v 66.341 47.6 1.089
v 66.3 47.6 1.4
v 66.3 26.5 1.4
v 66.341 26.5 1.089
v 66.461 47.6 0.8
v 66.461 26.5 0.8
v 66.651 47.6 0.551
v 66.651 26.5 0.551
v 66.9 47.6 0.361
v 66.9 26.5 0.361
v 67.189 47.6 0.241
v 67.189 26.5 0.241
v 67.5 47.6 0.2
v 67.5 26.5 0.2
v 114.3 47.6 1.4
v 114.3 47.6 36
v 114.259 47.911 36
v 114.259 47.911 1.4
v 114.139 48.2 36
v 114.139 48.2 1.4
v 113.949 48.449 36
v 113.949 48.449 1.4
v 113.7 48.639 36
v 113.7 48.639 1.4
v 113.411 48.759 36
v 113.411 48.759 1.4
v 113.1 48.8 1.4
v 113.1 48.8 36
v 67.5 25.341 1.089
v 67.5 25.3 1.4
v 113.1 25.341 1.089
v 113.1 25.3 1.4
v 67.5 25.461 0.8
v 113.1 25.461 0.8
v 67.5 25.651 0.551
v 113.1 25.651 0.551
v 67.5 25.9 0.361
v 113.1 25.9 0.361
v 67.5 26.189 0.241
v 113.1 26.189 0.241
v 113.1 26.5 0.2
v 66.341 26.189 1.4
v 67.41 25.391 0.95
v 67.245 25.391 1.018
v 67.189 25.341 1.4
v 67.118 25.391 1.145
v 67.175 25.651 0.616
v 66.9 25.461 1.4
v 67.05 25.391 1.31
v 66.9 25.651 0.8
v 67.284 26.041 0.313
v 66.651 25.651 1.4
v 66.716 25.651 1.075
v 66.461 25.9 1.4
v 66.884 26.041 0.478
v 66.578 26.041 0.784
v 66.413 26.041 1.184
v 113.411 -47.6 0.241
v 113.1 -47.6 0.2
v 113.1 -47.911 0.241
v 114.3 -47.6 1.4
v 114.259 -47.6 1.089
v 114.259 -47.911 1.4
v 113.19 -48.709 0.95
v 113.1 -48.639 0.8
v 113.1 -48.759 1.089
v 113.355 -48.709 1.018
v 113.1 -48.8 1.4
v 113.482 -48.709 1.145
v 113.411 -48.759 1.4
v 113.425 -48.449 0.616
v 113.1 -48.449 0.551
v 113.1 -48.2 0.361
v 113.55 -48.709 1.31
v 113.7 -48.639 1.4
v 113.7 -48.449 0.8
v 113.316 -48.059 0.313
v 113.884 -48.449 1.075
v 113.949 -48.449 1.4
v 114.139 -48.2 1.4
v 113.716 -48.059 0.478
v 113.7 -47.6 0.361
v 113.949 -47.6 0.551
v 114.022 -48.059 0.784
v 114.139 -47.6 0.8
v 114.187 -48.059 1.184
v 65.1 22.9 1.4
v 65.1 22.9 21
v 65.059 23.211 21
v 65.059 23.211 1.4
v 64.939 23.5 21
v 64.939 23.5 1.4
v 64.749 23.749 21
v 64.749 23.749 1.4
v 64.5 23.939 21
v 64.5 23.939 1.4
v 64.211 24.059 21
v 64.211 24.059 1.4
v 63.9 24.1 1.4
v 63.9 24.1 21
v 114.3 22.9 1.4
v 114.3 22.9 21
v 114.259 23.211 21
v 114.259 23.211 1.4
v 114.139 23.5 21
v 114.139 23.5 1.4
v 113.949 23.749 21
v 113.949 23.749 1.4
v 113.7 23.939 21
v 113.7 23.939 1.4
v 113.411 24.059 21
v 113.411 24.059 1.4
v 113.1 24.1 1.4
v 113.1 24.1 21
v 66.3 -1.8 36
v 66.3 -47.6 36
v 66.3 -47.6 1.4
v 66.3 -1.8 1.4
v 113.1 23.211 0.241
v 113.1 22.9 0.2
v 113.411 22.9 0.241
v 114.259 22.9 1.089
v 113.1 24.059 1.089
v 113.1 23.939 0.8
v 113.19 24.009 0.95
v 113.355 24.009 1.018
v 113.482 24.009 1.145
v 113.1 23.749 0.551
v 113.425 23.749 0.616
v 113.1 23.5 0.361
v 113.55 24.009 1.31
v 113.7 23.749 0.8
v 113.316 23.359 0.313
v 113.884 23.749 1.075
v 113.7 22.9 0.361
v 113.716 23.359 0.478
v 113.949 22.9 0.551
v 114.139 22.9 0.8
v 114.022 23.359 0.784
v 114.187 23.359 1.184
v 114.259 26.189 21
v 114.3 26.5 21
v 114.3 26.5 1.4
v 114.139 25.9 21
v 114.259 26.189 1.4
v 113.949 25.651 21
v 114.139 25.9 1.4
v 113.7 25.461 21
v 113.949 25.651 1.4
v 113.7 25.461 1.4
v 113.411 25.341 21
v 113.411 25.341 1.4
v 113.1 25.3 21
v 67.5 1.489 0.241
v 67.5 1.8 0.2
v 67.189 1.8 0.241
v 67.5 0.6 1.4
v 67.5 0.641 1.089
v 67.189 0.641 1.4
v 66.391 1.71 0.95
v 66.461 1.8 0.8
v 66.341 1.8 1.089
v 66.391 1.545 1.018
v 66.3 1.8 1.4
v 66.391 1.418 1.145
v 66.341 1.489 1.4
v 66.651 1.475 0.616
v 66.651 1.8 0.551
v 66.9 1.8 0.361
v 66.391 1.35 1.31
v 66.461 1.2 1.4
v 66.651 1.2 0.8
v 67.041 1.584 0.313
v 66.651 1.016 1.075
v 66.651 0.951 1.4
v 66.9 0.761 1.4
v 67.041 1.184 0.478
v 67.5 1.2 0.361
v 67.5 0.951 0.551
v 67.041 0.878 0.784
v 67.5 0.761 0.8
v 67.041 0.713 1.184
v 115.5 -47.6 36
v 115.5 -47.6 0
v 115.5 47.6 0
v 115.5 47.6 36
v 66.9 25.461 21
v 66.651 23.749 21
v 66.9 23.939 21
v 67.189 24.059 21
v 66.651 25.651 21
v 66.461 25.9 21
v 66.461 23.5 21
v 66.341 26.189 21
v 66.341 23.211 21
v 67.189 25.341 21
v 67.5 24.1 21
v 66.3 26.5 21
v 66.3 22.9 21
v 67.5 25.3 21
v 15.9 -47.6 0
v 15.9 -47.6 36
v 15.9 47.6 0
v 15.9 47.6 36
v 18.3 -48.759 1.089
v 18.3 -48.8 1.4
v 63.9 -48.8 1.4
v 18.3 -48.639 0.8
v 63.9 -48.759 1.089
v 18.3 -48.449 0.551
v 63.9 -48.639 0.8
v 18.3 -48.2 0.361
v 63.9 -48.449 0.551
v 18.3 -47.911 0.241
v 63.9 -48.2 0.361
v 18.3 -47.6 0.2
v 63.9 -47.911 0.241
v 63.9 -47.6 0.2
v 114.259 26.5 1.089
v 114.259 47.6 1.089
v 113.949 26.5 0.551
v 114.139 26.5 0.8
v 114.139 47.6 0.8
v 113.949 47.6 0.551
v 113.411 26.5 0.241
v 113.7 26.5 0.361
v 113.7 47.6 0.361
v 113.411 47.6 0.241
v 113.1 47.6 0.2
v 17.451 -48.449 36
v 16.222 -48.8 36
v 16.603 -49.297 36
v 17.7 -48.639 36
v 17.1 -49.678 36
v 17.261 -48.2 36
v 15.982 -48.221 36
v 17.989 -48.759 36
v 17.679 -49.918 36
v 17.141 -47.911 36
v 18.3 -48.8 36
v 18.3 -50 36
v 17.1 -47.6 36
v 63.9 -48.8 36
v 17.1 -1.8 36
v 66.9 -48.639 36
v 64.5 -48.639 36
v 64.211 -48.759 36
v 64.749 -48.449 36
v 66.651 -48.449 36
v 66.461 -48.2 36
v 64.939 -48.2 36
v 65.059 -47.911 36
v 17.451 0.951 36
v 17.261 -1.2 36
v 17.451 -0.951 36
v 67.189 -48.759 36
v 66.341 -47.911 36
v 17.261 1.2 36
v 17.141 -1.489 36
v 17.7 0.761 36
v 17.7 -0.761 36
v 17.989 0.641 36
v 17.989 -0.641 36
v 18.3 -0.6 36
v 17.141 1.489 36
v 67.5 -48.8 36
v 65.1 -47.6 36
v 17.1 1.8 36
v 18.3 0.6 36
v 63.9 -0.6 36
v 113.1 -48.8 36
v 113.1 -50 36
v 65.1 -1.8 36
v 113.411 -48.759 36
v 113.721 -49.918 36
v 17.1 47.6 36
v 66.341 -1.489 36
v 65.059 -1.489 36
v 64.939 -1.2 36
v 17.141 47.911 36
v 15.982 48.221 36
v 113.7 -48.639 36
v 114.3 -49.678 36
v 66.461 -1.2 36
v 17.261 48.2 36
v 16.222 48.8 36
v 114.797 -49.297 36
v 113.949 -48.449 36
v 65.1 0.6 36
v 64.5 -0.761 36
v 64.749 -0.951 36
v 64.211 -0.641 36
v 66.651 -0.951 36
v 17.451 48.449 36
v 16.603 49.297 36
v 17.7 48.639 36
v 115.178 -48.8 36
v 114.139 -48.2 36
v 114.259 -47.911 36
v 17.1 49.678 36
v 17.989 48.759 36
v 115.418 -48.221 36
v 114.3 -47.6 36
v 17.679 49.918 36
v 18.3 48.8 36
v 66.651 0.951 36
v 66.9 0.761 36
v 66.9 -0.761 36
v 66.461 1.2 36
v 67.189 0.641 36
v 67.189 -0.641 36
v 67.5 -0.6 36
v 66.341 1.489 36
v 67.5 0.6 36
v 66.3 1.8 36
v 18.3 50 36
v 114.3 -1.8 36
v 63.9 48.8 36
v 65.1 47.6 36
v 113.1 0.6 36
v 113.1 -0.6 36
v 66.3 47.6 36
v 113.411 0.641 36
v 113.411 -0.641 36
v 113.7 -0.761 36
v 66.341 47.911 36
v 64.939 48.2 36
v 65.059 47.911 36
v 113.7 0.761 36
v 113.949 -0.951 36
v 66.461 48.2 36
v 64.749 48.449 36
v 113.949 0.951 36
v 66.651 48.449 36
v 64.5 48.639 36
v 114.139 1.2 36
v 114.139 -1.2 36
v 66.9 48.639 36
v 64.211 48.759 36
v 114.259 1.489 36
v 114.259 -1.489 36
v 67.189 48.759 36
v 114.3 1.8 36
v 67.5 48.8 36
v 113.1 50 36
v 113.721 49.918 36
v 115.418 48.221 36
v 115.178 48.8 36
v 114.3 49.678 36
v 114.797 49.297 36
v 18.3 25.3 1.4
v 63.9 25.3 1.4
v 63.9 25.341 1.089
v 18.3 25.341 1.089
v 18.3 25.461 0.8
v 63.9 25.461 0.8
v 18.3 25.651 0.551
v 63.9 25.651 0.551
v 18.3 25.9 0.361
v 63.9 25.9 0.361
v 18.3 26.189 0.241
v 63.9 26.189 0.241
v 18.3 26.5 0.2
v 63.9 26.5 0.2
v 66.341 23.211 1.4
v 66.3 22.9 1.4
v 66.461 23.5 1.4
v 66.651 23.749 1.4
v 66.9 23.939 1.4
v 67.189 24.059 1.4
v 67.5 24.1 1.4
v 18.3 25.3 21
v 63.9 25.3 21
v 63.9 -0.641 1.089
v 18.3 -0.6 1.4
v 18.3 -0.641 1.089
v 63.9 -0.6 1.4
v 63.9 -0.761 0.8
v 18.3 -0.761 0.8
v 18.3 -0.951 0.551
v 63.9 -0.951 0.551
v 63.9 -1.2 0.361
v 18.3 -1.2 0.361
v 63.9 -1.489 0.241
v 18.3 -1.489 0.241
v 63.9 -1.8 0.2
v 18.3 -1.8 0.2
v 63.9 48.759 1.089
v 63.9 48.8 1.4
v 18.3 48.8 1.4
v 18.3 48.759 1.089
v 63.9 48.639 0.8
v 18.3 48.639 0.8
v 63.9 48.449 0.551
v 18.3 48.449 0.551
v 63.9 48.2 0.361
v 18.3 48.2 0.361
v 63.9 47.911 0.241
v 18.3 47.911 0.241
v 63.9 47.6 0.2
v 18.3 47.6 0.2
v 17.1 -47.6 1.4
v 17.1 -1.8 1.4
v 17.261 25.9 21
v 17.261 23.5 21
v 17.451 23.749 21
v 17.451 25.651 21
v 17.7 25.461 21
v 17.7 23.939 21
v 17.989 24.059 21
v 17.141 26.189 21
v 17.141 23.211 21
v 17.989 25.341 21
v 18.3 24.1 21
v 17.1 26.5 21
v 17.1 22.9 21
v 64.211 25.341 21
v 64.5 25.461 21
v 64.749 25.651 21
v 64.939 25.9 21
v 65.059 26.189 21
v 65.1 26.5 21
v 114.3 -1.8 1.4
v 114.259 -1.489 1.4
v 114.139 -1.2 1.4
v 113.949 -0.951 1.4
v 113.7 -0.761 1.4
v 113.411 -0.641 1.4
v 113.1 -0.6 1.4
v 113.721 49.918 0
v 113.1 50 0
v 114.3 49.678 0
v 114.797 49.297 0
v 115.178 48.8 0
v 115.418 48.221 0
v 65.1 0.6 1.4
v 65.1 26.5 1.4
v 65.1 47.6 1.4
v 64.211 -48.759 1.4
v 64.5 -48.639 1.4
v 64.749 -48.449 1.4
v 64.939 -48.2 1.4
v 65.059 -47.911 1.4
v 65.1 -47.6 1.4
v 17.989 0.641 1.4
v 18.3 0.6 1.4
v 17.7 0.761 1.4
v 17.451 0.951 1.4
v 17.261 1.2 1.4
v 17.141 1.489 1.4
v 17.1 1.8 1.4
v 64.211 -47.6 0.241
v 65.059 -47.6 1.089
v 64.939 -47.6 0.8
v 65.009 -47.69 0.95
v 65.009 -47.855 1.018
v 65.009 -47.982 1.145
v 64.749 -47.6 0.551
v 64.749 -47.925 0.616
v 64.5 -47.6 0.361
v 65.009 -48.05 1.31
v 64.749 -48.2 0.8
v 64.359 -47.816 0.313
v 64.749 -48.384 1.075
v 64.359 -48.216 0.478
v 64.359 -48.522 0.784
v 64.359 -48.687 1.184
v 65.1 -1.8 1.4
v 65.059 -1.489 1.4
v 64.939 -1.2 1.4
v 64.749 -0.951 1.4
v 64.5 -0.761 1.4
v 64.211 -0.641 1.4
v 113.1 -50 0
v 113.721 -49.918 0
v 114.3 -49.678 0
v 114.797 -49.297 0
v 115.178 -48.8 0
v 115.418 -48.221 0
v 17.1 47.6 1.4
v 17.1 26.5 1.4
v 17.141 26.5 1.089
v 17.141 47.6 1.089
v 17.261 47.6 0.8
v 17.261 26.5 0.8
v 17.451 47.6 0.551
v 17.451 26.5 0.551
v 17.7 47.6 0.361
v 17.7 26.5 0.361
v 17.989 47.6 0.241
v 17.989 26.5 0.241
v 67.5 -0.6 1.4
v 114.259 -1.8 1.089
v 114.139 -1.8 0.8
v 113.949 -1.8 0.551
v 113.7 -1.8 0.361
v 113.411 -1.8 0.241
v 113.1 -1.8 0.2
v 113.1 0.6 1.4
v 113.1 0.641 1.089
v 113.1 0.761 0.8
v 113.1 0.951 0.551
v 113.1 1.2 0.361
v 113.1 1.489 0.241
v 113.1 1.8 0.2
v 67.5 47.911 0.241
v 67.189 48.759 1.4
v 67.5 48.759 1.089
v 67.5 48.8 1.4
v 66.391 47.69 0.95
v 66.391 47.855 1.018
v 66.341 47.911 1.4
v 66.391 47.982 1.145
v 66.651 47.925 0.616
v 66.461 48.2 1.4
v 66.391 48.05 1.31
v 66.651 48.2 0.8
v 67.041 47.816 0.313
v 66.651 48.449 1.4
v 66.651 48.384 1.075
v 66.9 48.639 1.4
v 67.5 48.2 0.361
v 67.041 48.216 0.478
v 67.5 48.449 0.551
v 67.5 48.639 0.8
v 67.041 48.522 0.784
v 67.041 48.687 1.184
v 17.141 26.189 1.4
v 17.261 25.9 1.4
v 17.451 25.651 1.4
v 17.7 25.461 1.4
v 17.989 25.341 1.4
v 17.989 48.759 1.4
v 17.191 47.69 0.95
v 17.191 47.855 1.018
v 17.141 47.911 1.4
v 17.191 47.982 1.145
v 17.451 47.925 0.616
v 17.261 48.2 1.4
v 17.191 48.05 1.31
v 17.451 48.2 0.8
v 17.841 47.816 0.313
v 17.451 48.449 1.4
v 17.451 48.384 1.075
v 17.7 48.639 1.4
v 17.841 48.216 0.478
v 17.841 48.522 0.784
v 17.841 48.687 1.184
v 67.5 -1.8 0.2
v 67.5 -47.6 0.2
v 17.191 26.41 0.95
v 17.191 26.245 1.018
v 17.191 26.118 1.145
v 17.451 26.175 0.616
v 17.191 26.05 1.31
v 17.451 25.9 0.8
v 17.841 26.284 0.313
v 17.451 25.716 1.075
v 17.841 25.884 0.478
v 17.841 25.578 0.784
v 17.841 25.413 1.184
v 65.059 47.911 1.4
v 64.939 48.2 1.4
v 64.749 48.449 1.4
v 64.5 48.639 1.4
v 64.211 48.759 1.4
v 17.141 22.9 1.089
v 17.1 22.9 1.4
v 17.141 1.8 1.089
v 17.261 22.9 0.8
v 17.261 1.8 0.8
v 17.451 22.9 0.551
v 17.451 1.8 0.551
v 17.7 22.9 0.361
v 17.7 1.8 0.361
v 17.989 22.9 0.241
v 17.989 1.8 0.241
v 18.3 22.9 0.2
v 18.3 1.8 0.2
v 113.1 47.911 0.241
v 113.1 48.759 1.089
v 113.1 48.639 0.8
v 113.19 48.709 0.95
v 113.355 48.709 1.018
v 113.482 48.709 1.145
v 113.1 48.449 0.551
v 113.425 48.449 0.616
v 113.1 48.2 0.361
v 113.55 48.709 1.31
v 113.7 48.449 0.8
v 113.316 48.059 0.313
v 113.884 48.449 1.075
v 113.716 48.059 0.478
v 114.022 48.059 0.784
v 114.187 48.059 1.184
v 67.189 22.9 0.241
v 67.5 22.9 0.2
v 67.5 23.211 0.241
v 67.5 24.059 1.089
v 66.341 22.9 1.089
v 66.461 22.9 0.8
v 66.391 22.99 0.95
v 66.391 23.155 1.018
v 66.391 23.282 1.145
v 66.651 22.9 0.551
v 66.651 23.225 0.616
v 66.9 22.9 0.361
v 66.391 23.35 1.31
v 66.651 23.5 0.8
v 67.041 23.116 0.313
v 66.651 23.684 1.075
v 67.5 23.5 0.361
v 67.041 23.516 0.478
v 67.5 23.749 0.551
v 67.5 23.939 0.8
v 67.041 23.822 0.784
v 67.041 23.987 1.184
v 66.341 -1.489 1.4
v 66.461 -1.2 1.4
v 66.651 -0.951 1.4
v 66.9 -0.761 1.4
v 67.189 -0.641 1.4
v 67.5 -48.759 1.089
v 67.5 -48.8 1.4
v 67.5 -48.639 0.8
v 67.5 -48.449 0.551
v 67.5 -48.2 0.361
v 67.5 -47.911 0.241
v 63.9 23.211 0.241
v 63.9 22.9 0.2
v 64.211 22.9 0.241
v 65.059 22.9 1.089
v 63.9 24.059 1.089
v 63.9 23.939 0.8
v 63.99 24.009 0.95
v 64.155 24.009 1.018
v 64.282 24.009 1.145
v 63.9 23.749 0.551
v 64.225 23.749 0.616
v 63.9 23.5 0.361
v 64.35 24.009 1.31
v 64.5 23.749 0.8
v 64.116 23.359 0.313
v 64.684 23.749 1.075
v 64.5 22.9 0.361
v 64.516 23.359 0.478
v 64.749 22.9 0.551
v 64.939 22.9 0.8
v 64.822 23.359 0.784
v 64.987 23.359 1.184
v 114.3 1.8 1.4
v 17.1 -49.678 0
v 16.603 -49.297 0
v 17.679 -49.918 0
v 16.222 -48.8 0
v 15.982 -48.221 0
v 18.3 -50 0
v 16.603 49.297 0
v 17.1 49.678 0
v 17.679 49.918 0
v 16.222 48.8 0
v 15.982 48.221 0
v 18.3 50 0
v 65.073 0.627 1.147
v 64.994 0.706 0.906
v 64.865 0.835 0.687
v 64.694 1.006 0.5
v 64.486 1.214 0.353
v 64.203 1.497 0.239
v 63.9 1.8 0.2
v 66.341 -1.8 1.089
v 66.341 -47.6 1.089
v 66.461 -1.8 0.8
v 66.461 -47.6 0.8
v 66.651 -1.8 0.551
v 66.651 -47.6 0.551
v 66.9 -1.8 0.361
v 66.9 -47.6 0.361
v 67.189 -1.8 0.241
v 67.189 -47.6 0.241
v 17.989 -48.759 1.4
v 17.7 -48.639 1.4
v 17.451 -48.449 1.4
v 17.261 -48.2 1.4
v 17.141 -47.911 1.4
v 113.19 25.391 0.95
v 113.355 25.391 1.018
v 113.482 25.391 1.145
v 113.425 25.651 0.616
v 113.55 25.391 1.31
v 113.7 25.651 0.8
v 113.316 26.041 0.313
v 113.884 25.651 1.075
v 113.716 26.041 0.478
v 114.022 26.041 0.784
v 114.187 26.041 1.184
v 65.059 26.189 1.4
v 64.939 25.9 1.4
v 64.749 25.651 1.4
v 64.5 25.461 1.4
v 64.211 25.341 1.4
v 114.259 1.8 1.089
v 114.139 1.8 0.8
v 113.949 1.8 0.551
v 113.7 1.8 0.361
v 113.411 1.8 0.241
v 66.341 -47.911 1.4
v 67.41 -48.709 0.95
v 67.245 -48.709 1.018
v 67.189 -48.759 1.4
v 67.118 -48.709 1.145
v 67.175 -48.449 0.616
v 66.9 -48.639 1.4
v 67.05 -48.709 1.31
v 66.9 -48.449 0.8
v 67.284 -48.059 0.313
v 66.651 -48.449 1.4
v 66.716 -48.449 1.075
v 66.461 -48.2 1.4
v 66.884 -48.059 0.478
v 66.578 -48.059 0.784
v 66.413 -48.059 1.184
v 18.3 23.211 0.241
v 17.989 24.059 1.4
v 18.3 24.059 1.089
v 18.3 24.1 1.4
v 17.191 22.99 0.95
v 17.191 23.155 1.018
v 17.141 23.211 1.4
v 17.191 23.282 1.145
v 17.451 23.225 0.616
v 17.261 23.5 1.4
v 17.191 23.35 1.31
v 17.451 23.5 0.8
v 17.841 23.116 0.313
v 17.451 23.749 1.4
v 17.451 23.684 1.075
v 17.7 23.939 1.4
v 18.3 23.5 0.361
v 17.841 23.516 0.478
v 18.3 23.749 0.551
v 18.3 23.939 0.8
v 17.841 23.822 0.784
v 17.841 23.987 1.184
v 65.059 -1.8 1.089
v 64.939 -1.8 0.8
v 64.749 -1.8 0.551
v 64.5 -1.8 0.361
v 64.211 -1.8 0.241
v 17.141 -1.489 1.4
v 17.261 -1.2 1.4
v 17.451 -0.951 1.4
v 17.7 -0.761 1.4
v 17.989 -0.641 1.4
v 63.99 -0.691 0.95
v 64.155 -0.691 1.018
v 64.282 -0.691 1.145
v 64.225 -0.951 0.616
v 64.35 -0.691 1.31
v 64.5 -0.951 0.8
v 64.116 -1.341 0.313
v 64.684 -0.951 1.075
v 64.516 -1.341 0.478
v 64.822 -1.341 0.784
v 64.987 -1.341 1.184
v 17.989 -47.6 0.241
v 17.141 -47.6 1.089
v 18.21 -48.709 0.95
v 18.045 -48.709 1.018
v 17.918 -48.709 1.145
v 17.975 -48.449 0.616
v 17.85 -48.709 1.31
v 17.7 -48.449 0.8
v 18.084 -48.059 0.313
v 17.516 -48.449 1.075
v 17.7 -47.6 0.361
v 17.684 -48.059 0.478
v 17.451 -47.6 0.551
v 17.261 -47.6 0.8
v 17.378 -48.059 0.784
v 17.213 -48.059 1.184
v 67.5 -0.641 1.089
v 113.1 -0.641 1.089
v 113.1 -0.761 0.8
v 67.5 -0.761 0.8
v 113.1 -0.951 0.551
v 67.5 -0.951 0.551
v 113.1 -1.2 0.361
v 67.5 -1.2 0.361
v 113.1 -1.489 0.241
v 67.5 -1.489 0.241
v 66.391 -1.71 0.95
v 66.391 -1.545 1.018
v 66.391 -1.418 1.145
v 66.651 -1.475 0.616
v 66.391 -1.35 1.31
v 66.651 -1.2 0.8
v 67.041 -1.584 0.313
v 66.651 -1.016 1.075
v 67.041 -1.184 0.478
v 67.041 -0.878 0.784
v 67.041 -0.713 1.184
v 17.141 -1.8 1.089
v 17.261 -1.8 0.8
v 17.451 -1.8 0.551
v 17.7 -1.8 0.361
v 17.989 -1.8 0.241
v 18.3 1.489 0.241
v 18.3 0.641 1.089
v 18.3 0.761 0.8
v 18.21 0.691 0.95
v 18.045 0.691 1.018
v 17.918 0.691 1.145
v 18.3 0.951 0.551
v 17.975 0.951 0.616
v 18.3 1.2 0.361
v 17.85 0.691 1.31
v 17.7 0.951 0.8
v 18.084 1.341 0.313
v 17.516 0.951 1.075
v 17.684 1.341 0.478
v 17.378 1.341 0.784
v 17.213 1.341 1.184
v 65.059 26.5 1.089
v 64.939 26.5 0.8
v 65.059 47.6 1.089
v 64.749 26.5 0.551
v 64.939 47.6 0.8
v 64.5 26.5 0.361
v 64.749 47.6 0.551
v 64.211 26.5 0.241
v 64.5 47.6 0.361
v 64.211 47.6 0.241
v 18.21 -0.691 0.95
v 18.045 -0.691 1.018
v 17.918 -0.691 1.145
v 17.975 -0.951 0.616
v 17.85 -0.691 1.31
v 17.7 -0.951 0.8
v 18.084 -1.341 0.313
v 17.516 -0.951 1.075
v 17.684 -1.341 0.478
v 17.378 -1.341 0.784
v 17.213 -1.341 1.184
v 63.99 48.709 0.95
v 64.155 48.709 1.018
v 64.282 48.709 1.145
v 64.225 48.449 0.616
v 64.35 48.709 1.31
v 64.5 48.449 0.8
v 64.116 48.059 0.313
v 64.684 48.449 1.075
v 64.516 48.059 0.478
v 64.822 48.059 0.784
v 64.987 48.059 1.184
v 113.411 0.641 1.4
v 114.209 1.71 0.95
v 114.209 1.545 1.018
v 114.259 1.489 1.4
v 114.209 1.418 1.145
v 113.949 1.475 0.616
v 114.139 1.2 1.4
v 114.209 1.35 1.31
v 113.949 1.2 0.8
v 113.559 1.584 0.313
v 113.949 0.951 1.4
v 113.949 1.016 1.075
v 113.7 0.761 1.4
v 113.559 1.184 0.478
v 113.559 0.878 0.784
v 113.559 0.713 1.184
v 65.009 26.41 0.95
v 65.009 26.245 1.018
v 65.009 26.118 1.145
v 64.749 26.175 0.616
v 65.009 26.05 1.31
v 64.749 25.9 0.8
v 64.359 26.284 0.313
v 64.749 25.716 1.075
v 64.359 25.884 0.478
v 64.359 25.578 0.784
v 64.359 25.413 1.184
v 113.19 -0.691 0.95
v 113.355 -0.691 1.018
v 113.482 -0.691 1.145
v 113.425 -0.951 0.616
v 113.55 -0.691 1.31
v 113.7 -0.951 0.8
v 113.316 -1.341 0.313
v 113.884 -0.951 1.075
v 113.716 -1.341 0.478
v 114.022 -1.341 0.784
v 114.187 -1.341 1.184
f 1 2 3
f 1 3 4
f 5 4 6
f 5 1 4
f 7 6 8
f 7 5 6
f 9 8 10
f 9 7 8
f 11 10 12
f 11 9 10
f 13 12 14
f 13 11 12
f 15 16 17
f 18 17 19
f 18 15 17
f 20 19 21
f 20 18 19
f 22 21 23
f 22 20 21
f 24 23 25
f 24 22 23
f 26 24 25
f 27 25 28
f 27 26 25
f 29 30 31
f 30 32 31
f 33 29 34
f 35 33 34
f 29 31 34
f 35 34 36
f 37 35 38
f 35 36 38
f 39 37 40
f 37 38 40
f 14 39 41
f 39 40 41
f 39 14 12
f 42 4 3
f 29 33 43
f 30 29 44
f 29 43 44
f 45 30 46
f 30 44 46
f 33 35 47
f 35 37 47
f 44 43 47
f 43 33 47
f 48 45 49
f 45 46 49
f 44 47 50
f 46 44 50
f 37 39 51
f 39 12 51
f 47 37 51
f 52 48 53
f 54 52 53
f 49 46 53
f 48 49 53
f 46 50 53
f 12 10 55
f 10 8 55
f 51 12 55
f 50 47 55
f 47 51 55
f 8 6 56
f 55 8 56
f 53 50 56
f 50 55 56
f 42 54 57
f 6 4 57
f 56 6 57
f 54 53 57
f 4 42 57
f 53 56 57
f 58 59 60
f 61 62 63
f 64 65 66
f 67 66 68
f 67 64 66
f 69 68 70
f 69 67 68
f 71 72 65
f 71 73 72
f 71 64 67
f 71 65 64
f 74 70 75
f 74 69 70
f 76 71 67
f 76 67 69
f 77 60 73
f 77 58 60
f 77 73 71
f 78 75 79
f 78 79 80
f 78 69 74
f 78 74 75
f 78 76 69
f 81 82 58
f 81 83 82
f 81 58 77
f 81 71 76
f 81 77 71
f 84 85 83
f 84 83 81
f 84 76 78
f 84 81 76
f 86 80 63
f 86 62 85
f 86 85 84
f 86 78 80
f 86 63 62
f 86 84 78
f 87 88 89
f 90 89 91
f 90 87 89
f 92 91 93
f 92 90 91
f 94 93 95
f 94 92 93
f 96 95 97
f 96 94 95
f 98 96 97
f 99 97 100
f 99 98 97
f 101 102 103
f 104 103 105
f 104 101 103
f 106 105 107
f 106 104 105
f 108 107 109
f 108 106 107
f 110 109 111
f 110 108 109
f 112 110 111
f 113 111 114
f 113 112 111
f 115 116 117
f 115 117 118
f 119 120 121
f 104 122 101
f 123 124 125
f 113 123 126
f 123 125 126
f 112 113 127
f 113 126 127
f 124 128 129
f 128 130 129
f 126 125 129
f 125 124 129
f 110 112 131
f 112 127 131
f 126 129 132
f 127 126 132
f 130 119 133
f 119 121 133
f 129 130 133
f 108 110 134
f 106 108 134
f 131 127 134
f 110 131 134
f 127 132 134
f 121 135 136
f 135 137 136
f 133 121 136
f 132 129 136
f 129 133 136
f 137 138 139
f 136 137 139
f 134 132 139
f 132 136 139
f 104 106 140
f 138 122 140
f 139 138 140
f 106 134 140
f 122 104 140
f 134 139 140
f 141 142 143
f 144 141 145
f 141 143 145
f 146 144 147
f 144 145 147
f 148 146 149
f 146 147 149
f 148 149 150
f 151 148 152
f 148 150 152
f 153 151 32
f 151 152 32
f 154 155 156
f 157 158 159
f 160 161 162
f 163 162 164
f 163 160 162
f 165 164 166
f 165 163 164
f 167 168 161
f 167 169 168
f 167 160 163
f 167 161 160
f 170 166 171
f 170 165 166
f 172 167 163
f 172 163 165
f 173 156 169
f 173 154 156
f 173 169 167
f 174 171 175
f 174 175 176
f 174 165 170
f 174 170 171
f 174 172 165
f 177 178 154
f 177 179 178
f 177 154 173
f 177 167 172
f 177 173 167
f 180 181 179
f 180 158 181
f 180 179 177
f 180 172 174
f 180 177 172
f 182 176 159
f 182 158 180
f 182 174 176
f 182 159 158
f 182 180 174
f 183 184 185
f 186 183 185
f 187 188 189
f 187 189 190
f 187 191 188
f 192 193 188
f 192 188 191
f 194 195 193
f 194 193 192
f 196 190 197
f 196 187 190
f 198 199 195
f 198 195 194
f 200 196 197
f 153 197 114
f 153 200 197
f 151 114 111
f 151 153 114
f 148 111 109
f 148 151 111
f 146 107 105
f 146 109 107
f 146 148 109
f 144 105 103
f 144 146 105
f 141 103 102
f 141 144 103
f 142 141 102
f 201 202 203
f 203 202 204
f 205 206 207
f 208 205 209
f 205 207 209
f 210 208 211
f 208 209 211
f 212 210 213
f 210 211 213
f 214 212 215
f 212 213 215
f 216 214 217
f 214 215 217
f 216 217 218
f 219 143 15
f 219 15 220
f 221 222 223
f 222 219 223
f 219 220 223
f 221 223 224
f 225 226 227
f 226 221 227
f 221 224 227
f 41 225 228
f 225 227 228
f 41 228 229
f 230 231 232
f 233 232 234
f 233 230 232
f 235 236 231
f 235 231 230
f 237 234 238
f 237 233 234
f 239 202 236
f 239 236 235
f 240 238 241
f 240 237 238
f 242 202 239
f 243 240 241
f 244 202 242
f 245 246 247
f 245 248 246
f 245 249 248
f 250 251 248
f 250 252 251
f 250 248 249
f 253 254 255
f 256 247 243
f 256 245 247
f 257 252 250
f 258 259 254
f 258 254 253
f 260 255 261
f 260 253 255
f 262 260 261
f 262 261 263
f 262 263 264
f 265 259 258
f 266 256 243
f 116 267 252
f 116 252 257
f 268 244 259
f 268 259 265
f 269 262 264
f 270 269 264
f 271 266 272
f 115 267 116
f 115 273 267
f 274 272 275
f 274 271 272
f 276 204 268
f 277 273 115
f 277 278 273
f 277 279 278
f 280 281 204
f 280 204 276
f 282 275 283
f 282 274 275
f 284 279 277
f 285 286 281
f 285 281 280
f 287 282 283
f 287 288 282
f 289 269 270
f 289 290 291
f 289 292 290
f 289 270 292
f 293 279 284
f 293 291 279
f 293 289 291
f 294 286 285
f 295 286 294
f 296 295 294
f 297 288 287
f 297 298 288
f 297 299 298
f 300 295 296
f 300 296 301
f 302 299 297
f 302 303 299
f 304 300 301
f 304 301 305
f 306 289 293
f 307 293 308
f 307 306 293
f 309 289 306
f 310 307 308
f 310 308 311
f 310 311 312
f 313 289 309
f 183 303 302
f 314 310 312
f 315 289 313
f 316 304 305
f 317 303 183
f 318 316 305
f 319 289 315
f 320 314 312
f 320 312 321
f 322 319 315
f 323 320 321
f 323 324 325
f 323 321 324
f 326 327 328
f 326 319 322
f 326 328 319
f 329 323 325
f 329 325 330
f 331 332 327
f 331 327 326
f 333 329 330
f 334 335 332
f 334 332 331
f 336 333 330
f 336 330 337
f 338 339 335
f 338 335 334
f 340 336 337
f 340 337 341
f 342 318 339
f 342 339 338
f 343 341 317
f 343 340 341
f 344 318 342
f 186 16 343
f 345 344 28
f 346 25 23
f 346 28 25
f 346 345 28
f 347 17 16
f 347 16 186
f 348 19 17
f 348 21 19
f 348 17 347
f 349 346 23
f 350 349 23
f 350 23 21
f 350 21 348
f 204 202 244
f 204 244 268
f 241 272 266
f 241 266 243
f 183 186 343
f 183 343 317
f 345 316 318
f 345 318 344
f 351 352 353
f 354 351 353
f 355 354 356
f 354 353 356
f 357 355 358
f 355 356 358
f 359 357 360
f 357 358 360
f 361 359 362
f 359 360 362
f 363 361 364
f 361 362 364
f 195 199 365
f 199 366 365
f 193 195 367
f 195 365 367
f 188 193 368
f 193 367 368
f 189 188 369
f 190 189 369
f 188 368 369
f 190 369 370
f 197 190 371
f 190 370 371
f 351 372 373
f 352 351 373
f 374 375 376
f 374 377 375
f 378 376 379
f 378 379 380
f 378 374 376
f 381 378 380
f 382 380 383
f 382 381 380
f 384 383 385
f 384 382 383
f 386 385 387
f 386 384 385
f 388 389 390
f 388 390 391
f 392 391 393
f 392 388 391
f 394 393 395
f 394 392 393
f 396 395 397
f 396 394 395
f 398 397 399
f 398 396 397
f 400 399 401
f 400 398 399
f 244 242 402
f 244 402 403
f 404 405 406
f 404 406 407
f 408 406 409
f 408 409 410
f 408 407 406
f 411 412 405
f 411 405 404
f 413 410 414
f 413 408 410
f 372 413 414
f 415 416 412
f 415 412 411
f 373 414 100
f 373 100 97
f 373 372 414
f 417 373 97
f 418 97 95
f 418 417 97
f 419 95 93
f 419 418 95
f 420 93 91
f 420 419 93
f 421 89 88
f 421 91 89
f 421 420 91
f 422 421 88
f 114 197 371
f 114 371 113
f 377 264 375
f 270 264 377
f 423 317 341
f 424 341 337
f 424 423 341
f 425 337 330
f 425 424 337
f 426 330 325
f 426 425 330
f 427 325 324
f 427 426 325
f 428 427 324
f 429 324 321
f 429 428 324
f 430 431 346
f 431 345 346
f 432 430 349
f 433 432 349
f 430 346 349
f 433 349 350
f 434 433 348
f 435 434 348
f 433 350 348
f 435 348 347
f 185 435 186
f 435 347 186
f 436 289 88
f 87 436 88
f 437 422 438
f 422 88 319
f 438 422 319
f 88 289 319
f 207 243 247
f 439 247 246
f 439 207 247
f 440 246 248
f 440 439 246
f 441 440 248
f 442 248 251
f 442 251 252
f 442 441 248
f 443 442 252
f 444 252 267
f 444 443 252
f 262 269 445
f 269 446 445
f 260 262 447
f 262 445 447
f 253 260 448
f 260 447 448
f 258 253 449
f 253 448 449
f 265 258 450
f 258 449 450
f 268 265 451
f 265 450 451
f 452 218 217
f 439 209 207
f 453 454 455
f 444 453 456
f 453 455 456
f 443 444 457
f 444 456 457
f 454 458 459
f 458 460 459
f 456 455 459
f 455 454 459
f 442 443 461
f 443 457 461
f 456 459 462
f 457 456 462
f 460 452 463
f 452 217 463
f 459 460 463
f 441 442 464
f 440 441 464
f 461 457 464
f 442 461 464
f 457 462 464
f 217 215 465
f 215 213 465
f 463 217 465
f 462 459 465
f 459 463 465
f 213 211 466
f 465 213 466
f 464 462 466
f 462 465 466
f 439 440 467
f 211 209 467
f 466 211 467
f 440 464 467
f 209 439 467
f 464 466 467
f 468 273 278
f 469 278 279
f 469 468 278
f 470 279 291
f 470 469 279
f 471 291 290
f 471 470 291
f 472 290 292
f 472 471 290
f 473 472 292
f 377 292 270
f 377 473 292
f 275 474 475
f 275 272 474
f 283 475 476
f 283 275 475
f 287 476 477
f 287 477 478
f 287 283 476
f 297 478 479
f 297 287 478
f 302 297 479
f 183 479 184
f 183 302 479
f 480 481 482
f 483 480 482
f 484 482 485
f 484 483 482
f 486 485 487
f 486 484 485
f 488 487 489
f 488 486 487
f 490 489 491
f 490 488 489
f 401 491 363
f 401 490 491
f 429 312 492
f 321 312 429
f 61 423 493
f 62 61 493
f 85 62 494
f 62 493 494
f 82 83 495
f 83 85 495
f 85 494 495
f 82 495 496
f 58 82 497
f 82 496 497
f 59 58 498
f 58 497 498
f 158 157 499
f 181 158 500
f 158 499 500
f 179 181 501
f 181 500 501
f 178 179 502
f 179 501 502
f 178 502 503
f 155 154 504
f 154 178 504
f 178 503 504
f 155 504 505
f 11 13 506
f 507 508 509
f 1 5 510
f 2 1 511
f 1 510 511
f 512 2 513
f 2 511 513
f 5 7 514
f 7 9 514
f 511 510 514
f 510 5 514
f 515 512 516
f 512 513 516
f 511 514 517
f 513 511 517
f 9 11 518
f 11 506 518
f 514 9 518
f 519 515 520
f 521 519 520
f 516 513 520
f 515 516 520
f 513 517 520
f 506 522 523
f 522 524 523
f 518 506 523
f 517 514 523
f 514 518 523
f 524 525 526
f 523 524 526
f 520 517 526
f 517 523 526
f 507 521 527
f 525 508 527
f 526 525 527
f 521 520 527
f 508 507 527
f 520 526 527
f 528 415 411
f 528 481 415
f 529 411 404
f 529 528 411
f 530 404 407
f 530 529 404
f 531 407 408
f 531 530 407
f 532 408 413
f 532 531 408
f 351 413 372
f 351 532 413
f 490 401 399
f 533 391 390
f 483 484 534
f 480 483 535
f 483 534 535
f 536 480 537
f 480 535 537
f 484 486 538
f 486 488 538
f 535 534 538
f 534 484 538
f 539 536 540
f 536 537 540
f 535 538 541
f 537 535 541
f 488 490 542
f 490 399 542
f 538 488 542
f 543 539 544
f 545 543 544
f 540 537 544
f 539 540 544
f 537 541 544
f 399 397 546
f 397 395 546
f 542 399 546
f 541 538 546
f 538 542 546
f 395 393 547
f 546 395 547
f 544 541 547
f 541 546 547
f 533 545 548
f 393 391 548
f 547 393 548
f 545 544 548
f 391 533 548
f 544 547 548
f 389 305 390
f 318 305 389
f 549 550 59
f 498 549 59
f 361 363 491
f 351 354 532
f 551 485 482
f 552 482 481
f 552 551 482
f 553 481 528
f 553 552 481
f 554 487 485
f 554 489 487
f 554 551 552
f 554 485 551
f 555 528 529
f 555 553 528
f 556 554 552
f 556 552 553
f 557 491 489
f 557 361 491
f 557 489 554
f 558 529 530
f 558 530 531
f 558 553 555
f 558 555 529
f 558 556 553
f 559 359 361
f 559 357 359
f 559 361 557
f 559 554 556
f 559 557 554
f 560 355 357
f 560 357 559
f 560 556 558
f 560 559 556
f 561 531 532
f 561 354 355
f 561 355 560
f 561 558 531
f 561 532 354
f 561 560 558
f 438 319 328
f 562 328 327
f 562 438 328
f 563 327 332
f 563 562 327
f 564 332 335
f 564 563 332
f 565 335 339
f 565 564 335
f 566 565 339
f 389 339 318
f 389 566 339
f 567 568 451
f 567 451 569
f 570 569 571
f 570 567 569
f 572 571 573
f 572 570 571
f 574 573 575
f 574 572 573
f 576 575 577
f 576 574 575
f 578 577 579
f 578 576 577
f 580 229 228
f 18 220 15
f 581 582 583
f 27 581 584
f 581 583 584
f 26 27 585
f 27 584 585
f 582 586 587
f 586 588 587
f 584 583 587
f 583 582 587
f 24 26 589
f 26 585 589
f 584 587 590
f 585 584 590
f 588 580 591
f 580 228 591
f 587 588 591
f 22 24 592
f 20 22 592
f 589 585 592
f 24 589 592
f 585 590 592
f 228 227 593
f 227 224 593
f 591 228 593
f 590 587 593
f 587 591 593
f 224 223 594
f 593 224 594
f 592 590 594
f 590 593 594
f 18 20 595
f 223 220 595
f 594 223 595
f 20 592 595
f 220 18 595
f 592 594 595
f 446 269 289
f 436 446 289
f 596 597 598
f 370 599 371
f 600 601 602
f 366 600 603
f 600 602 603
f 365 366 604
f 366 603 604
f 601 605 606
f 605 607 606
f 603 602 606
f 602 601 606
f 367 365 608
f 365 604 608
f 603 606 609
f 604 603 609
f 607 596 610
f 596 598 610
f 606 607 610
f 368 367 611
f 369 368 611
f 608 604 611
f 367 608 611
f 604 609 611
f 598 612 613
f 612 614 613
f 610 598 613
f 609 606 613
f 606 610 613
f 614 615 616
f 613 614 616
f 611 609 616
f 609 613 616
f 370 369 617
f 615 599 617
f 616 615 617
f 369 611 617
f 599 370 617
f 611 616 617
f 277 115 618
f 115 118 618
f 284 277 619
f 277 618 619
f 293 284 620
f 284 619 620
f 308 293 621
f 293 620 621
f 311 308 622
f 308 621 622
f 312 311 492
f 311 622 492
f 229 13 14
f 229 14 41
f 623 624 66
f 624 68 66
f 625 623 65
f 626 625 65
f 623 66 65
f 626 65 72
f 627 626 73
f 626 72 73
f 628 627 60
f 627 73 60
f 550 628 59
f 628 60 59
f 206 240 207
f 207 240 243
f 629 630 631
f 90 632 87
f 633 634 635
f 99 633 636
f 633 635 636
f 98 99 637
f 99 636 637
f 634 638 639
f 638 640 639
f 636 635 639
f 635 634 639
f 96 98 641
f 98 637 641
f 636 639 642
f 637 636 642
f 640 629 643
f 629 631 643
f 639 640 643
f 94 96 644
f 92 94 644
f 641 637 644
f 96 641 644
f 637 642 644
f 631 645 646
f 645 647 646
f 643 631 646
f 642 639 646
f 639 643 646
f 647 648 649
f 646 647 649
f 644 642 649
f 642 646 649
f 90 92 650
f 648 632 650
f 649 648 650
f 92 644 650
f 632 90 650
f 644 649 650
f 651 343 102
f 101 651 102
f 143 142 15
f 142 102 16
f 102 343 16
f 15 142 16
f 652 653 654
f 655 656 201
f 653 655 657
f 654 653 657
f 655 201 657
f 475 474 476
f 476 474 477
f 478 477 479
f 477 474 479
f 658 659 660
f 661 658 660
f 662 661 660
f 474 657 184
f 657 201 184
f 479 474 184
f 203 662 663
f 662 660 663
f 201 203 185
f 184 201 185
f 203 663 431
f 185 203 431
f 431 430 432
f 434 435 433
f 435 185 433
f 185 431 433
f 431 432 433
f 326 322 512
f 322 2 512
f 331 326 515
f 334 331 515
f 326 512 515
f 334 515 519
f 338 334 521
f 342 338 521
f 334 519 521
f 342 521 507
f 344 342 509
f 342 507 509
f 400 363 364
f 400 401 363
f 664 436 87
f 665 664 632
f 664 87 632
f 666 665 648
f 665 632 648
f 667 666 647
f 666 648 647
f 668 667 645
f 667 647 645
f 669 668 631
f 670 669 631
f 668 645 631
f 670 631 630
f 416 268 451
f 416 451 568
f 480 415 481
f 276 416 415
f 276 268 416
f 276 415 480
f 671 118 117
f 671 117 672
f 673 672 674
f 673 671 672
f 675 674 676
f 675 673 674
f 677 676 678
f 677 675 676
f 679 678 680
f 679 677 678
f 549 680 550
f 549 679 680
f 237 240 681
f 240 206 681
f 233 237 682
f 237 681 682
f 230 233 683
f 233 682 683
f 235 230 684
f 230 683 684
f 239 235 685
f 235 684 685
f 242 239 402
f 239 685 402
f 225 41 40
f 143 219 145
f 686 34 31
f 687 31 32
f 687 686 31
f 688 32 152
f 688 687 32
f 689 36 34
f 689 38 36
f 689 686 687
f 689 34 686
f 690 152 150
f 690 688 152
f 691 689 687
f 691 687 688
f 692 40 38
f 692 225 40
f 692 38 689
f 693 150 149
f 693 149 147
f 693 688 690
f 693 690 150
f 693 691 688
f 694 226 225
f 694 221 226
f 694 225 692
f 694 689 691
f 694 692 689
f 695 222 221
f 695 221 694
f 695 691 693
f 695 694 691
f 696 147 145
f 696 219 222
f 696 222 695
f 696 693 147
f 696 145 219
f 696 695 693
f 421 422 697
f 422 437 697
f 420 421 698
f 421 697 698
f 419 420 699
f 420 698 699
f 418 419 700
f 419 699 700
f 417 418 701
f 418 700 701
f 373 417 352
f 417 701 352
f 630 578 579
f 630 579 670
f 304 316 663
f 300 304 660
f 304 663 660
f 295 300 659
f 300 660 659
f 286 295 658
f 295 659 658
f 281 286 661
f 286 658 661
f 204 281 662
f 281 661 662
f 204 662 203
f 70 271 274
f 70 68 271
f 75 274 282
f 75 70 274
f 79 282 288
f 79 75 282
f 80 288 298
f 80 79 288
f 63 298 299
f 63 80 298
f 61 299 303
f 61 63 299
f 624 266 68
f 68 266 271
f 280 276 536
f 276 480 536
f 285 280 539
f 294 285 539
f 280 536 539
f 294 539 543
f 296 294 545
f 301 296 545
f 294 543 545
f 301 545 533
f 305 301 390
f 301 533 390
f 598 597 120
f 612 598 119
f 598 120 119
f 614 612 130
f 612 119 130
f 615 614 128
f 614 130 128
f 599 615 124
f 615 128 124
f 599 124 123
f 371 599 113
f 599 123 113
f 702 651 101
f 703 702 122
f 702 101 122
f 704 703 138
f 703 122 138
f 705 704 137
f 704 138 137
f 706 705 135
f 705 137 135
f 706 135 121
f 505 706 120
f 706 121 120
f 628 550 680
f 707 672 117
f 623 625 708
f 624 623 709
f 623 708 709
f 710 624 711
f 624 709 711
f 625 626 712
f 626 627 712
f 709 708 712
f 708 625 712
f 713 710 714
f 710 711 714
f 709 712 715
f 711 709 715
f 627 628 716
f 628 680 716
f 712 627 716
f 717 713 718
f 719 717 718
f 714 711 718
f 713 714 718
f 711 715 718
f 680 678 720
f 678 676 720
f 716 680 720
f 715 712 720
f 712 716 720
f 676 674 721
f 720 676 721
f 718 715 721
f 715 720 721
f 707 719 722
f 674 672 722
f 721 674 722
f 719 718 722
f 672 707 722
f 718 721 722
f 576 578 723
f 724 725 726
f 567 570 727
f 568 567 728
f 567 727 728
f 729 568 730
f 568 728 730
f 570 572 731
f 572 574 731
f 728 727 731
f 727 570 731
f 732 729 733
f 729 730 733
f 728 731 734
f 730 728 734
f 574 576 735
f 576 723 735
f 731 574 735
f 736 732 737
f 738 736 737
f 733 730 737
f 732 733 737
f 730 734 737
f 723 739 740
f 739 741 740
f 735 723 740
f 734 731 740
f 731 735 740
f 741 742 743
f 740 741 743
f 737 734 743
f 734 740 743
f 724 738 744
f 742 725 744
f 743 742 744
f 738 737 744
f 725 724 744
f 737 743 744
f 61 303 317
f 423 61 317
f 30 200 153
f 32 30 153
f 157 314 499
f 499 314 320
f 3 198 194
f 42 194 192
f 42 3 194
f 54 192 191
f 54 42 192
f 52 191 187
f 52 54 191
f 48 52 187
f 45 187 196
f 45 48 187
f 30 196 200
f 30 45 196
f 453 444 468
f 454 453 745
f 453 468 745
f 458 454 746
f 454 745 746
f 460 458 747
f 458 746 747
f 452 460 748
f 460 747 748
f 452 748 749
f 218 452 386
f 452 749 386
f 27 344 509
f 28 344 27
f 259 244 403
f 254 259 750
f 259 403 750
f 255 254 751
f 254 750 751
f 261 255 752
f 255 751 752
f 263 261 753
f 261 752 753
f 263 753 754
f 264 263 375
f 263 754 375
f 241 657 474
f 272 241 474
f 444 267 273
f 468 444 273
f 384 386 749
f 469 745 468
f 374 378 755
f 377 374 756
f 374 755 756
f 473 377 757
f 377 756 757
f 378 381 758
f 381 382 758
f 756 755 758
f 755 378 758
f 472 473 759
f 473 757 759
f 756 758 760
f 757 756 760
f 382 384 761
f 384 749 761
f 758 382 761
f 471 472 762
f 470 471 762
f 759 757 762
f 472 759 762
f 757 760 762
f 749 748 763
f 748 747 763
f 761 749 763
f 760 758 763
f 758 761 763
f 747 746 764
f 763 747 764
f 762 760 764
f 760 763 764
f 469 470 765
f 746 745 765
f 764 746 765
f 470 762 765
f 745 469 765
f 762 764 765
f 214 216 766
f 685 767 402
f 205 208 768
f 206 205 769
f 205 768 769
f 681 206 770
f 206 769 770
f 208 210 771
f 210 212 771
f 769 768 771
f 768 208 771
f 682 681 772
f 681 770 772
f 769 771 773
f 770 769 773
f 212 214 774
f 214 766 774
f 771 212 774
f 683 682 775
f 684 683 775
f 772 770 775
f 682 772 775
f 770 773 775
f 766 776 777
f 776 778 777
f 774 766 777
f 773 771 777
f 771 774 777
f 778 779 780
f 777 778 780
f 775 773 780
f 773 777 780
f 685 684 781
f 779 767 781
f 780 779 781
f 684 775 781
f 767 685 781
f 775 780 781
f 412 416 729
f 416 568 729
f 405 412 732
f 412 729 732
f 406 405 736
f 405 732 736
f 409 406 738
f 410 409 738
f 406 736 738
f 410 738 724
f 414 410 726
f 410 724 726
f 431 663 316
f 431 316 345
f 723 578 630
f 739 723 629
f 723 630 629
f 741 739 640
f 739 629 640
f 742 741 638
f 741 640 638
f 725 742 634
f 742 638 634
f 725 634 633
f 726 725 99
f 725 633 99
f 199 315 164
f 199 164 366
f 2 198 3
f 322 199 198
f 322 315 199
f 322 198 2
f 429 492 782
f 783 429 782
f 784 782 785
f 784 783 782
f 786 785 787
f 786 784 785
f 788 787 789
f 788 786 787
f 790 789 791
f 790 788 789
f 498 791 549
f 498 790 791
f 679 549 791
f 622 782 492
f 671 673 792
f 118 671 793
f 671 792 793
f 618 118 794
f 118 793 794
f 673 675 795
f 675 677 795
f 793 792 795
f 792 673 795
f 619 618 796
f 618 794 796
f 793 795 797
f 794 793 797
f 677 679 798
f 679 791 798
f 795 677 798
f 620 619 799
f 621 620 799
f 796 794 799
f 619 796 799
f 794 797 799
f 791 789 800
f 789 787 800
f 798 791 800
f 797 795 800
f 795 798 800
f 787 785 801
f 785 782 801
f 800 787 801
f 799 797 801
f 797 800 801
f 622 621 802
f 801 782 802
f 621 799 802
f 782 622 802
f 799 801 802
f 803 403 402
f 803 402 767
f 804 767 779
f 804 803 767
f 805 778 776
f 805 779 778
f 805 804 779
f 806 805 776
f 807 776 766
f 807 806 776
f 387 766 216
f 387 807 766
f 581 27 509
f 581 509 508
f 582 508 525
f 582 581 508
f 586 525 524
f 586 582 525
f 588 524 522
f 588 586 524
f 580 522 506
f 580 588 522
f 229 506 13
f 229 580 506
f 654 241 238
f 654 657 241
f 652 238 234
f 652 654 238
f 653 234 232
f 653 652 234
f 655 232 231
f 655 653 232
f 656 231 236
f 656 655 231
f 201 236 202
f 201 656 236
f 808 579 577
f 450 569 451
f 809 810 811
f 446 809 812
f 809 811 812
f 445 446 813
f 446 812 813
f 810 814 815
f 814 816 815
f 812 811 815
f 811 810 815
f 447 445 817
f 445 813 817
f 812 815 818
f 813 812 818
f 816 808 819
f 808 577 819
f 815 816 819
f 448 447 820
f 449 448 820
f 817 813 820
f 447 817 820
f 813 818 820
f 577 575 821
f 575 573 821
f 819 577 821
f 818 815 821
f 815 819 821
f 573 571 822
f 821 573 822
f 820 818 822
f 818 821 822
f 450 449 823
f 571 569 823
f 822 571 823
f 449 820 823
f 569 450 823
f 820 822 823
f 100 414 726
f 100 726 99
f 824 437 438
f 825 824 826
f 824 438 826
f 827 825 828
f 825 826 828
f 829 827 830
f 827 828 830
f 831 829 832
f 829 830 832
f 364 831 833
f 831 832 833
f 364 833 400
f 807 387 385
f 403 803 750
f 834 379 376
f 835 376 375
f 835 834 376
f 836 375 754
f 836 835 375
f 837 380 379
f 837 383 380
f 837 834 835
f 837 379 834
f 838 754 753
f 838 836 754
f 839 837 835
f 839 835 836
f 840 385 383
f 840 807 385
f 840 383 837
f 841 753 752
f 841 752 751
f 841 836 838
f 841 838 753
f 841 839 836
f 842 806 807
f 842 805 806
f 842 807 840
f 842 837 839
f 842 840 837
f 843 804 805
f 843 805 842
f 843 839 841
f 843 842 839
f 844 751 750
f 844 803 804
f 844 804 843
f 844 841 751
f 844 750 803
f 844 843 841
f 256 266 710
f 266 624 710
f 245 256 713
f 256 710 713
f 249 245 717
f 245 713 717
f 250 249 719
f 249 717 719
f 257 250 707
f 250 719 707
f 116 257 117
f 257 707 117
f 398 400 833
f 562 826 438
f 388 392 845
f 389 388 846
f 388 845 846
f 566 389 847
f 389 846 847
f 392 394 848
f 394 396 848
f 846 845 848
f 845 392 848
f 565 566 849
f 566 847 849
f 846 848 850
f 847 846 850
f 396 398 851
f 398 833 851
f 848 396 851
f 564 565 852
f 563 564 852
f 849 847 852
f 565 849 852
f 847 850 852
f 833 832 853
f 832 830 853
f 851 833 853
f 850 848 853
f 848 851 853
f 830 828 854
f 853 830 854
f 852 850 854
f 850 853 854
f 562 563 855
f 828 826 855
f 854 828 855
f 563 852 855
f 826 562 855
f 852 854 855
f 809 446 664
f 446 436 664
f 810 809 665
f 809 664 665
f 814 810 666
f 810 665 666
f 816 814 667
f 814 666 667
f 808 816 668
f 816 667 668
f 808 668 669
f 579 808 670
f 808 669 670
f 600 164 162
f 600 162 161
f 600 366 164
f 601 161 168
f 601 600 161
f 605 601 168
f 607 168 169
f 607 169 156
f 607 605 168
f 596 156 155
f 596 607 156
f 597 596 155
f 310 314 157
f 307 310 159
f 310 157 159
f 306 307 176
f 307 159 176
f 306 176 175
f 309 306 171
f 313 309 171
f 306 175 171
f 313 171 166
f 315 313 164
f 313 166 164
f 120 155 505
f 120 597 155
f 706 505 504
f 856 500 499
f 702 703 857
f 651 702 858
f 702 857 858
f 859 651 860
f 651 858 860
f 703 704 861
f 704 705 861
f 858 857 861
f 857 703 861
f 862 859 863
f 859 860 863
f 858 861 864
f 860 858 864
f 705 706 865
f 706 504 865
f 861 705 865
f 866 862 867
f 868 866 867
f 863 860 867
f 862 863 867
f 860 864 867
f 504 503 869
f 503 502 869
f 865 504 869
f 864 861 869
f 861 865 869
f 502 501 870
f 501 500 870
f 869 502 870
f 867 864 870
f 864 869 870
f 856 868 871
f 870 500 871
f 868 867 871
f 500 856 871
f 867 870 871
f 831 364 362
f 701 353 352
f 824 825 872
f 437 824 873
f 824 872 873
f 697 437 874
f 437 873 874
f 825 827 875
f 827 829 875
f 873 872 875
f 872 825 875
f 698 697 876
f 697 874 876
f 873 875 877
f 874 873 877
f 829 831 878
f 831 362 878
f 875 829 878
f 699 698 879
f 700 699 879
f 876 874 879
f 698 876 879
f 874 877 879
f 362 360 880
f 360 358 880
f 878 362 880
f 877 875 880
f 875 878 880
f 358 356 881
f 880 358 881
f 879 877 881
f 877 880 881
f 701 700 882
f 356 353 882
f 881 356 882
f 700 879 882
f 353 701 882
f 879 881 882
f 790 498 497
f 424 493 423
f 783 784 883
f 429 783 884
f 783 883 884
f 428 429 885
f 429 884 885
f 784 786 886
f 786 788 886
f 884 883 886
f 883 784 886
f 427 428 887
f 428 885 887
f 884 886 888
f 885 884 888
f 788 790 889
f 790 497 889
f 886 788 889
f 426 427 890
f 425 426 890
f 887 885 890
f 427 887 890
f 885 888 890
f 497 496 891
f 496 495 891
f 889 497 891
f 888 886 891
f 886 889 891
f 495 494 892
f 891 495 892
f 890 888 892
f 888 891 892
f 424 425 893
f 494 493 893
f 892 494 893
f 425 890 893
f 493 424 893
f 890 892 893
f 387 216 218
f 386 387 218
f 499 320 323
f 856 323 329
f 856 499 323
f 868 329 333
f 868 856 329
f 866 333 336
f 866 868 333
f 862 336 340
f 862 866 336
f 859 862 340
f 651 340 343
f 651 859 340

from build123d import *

# Parameters (mm, degrees)
F0_W      = 231
F0_H      = 100
F1_DEPTH  = 36
F2_W      = 48
F2_H      = 23.5
F2_H_2    = 48.2
F3_DEPTH  = 35.8
F4_W      = 48
F4_H      = 1.2
F5_DEPTH  = 15
F6_W      = 48
F6_H      = 97.6
F6_W_2    = 81
F7_DEPTH  = 35.8
F8_R      = 2.4
F9_R      = 1.2
F10_W     = 145.4325905085
F10_H     = 144.5563584566
F11_DEPTH = 40
F12_R     = 2.4


with BuildPart() as f1:
    # F0 (on Top) → F1 (new body)
    with BuildSketch(Plane.XY):
        Rectangle(F0_W, F0_H)
    extrude(amount=F1_DEPTH)

    # F2 (on face) → F3 (cut)
    with BuildSketch(Plane.XY.offset(36)):
        with Locations((41.1, 37.05)):
            Rectangle(F2_W, F2_H)
        with Locations((90.3, 37.05)):
            Rectangle(F2_W, F2_H)
        with Locations((41.1, 12.35)):
            Rectangle(F2_W, F2_H)
        with Locations((90.3, 12.35)):
            Rectangle(F2_W, F2_H)
        with Locations((41.1, -24.7)):
            Rectangle(F2_W, F2_H_2)
        with Locations((90.3, -24.7)):
            Rectangle(F2_W, F2_H_2)
    extrude(amount=-F3_DEPTH, mode=Mode.SUBTRACT)

    # F4 (on face) → F5 (cut)
    with BuildSketch(Plane.XY.offset(36)):
        with Locations((41.1, 24.7)):
            Rectangle(F4_W, F4_H)
        with Locations((90.3, 24.7)):
            Rectangle(F4_W, F4_H)
    extrude(amount=-F5_DEPTH, mode=Mode.SUBTRACT)

    # F6 (on face) → F7 (cut)
    with BuildSketch(Plane.XY.offset(36)):
        with Locations((-90.3, 0)):
            Rectangle(F6_W, F6_H)
        with Locations((-24.6, 0)):
            Rectangle(F6_W_2, F6_H)
    extrude(amount=-F7_DEPTH, mode=Mode.SUBTRACT)

    # F8
    f8_edges = [f1.edges().sort_by_distance(p)[0] for p in [
        (-115.5, -50, 18),
        (-115.5, 50, 18),
        (115.5, 50, 18),
        (115.5, -50, 18),
    ]]
    fillet(f8_edges, radius=F8_R)

    # F9
    f9_edges = [f1.edges().sort_by_distance(p)[0] for p in [
        (-90.3, 48.8, 0.2),
        (-114.3, 0, 0.2),
        (-90.3, -48.8, 0.2),
        (-66.3, 0, 0.2),
        (-24.6, 48.8, 0.2),
        (-65.1, 0, 0.2),
        (-24.6, -48.8, 0.2),
        (15.9, 0, 0.2),
        (41.1, 25.3, 0.2),
        (65.1, 37.05, 0.2),
        (41.1, 48.8, 0.2),
        (17.1, 37.05, 0.2),
        (114.3, 37.05, 0.2),
        (90.3, 48.8, 0.2),
        (66.3, 37.05, 0.2),
        (90.3, 25.3, 0.2),
        (65.1, 12.35, 0.2),
        (41.1, 24.1, 0.2),
        (17.1, 12.35, 0.2),
        (41.1, 0.6, 0.2),
        (90.3, 0.6, 0.2),
        (114.3, 12.35, 0.2),
        (90.3, 24.1, 0.2),
        (66.3, 12.35, 0.2),
        (17.1, -24.7, 0.2),
        (41.1, -48.8, 0.2),
        (65.1, -24.7, 0.2),
        (41.1, -0.6, 0.2),
        (114.3, -24.7, 0.2),
        (90.3, -0.6, 0.2),
        (66.3, -24.7, 0.2),
        (90.3, -48.8, 0.2),
        (-114.3, 48.8, 18.1),
        (-65.1, 48.8, 18.1),
        (-66.3, 48.8, 18.1),
        (-66.3, -48.8, 18.1),
        (-114.3, -48.8, 18.1),
        (15.9, 48.8, 18.1),
        (15.9, -48.8, 18.1),
        (-65.1, -48.8, 18.1),
        (17.1, -48.8, 18.1),
        (17.1, 0.6, 18.1),
        (17.1, 25.3, 10.6),
        (17.1, 48.8, 18.1),
        (17.1, 24.1, 10.6),
        (17.1, -0.6, 18.1),
        (65.1, -0.6, 18.1),
        (65.1, -48.8, 18.1),
        (65.1, 24.1, 10.6),
        (65.1, 25.3, 10.6),
        (65.1, 48.8, 18.1),
        (66.3, 48.8, 18.1),
        (114.3, 48.8, 18.1),
        (114.3, 24.1, 10.6),
        (114.3, 25.3, 10.6),
        (66.3, 25.3, 10.6),
        (66.3, 24.1, 10.6),
        (66.3, 0.6, 18.1),
        (66.3, -0.6, 18.1),
        (114.3, -0.6, 18.1),
        (114.3, 0.6, 18.1),
        (114.3, -48.8, 18.1),
        (66.3, -48.8, 18.1),
    ]]
    fillet(f9_edges, radius=F9_R)

    # F10 (on face) → F11 (cut)
    with BuildSketch(Plane.XY.offset(36)):
        with Locations((-56.8162952542, -9.1554522514)):
            Rectangle(F10_W, F10_H)
    extrude(amount=-F11_DEPTH, mode=Mode.SUBTRACT)

    # F12
    f12_edges = [f1.edges().sort_by_distance(p)[0] for p in [
        (15.9, 50, 18),
        (15.9, -50, 18),
    ]]
    fillet(f12_edges, radius=F12_R)


solid = f1.part
